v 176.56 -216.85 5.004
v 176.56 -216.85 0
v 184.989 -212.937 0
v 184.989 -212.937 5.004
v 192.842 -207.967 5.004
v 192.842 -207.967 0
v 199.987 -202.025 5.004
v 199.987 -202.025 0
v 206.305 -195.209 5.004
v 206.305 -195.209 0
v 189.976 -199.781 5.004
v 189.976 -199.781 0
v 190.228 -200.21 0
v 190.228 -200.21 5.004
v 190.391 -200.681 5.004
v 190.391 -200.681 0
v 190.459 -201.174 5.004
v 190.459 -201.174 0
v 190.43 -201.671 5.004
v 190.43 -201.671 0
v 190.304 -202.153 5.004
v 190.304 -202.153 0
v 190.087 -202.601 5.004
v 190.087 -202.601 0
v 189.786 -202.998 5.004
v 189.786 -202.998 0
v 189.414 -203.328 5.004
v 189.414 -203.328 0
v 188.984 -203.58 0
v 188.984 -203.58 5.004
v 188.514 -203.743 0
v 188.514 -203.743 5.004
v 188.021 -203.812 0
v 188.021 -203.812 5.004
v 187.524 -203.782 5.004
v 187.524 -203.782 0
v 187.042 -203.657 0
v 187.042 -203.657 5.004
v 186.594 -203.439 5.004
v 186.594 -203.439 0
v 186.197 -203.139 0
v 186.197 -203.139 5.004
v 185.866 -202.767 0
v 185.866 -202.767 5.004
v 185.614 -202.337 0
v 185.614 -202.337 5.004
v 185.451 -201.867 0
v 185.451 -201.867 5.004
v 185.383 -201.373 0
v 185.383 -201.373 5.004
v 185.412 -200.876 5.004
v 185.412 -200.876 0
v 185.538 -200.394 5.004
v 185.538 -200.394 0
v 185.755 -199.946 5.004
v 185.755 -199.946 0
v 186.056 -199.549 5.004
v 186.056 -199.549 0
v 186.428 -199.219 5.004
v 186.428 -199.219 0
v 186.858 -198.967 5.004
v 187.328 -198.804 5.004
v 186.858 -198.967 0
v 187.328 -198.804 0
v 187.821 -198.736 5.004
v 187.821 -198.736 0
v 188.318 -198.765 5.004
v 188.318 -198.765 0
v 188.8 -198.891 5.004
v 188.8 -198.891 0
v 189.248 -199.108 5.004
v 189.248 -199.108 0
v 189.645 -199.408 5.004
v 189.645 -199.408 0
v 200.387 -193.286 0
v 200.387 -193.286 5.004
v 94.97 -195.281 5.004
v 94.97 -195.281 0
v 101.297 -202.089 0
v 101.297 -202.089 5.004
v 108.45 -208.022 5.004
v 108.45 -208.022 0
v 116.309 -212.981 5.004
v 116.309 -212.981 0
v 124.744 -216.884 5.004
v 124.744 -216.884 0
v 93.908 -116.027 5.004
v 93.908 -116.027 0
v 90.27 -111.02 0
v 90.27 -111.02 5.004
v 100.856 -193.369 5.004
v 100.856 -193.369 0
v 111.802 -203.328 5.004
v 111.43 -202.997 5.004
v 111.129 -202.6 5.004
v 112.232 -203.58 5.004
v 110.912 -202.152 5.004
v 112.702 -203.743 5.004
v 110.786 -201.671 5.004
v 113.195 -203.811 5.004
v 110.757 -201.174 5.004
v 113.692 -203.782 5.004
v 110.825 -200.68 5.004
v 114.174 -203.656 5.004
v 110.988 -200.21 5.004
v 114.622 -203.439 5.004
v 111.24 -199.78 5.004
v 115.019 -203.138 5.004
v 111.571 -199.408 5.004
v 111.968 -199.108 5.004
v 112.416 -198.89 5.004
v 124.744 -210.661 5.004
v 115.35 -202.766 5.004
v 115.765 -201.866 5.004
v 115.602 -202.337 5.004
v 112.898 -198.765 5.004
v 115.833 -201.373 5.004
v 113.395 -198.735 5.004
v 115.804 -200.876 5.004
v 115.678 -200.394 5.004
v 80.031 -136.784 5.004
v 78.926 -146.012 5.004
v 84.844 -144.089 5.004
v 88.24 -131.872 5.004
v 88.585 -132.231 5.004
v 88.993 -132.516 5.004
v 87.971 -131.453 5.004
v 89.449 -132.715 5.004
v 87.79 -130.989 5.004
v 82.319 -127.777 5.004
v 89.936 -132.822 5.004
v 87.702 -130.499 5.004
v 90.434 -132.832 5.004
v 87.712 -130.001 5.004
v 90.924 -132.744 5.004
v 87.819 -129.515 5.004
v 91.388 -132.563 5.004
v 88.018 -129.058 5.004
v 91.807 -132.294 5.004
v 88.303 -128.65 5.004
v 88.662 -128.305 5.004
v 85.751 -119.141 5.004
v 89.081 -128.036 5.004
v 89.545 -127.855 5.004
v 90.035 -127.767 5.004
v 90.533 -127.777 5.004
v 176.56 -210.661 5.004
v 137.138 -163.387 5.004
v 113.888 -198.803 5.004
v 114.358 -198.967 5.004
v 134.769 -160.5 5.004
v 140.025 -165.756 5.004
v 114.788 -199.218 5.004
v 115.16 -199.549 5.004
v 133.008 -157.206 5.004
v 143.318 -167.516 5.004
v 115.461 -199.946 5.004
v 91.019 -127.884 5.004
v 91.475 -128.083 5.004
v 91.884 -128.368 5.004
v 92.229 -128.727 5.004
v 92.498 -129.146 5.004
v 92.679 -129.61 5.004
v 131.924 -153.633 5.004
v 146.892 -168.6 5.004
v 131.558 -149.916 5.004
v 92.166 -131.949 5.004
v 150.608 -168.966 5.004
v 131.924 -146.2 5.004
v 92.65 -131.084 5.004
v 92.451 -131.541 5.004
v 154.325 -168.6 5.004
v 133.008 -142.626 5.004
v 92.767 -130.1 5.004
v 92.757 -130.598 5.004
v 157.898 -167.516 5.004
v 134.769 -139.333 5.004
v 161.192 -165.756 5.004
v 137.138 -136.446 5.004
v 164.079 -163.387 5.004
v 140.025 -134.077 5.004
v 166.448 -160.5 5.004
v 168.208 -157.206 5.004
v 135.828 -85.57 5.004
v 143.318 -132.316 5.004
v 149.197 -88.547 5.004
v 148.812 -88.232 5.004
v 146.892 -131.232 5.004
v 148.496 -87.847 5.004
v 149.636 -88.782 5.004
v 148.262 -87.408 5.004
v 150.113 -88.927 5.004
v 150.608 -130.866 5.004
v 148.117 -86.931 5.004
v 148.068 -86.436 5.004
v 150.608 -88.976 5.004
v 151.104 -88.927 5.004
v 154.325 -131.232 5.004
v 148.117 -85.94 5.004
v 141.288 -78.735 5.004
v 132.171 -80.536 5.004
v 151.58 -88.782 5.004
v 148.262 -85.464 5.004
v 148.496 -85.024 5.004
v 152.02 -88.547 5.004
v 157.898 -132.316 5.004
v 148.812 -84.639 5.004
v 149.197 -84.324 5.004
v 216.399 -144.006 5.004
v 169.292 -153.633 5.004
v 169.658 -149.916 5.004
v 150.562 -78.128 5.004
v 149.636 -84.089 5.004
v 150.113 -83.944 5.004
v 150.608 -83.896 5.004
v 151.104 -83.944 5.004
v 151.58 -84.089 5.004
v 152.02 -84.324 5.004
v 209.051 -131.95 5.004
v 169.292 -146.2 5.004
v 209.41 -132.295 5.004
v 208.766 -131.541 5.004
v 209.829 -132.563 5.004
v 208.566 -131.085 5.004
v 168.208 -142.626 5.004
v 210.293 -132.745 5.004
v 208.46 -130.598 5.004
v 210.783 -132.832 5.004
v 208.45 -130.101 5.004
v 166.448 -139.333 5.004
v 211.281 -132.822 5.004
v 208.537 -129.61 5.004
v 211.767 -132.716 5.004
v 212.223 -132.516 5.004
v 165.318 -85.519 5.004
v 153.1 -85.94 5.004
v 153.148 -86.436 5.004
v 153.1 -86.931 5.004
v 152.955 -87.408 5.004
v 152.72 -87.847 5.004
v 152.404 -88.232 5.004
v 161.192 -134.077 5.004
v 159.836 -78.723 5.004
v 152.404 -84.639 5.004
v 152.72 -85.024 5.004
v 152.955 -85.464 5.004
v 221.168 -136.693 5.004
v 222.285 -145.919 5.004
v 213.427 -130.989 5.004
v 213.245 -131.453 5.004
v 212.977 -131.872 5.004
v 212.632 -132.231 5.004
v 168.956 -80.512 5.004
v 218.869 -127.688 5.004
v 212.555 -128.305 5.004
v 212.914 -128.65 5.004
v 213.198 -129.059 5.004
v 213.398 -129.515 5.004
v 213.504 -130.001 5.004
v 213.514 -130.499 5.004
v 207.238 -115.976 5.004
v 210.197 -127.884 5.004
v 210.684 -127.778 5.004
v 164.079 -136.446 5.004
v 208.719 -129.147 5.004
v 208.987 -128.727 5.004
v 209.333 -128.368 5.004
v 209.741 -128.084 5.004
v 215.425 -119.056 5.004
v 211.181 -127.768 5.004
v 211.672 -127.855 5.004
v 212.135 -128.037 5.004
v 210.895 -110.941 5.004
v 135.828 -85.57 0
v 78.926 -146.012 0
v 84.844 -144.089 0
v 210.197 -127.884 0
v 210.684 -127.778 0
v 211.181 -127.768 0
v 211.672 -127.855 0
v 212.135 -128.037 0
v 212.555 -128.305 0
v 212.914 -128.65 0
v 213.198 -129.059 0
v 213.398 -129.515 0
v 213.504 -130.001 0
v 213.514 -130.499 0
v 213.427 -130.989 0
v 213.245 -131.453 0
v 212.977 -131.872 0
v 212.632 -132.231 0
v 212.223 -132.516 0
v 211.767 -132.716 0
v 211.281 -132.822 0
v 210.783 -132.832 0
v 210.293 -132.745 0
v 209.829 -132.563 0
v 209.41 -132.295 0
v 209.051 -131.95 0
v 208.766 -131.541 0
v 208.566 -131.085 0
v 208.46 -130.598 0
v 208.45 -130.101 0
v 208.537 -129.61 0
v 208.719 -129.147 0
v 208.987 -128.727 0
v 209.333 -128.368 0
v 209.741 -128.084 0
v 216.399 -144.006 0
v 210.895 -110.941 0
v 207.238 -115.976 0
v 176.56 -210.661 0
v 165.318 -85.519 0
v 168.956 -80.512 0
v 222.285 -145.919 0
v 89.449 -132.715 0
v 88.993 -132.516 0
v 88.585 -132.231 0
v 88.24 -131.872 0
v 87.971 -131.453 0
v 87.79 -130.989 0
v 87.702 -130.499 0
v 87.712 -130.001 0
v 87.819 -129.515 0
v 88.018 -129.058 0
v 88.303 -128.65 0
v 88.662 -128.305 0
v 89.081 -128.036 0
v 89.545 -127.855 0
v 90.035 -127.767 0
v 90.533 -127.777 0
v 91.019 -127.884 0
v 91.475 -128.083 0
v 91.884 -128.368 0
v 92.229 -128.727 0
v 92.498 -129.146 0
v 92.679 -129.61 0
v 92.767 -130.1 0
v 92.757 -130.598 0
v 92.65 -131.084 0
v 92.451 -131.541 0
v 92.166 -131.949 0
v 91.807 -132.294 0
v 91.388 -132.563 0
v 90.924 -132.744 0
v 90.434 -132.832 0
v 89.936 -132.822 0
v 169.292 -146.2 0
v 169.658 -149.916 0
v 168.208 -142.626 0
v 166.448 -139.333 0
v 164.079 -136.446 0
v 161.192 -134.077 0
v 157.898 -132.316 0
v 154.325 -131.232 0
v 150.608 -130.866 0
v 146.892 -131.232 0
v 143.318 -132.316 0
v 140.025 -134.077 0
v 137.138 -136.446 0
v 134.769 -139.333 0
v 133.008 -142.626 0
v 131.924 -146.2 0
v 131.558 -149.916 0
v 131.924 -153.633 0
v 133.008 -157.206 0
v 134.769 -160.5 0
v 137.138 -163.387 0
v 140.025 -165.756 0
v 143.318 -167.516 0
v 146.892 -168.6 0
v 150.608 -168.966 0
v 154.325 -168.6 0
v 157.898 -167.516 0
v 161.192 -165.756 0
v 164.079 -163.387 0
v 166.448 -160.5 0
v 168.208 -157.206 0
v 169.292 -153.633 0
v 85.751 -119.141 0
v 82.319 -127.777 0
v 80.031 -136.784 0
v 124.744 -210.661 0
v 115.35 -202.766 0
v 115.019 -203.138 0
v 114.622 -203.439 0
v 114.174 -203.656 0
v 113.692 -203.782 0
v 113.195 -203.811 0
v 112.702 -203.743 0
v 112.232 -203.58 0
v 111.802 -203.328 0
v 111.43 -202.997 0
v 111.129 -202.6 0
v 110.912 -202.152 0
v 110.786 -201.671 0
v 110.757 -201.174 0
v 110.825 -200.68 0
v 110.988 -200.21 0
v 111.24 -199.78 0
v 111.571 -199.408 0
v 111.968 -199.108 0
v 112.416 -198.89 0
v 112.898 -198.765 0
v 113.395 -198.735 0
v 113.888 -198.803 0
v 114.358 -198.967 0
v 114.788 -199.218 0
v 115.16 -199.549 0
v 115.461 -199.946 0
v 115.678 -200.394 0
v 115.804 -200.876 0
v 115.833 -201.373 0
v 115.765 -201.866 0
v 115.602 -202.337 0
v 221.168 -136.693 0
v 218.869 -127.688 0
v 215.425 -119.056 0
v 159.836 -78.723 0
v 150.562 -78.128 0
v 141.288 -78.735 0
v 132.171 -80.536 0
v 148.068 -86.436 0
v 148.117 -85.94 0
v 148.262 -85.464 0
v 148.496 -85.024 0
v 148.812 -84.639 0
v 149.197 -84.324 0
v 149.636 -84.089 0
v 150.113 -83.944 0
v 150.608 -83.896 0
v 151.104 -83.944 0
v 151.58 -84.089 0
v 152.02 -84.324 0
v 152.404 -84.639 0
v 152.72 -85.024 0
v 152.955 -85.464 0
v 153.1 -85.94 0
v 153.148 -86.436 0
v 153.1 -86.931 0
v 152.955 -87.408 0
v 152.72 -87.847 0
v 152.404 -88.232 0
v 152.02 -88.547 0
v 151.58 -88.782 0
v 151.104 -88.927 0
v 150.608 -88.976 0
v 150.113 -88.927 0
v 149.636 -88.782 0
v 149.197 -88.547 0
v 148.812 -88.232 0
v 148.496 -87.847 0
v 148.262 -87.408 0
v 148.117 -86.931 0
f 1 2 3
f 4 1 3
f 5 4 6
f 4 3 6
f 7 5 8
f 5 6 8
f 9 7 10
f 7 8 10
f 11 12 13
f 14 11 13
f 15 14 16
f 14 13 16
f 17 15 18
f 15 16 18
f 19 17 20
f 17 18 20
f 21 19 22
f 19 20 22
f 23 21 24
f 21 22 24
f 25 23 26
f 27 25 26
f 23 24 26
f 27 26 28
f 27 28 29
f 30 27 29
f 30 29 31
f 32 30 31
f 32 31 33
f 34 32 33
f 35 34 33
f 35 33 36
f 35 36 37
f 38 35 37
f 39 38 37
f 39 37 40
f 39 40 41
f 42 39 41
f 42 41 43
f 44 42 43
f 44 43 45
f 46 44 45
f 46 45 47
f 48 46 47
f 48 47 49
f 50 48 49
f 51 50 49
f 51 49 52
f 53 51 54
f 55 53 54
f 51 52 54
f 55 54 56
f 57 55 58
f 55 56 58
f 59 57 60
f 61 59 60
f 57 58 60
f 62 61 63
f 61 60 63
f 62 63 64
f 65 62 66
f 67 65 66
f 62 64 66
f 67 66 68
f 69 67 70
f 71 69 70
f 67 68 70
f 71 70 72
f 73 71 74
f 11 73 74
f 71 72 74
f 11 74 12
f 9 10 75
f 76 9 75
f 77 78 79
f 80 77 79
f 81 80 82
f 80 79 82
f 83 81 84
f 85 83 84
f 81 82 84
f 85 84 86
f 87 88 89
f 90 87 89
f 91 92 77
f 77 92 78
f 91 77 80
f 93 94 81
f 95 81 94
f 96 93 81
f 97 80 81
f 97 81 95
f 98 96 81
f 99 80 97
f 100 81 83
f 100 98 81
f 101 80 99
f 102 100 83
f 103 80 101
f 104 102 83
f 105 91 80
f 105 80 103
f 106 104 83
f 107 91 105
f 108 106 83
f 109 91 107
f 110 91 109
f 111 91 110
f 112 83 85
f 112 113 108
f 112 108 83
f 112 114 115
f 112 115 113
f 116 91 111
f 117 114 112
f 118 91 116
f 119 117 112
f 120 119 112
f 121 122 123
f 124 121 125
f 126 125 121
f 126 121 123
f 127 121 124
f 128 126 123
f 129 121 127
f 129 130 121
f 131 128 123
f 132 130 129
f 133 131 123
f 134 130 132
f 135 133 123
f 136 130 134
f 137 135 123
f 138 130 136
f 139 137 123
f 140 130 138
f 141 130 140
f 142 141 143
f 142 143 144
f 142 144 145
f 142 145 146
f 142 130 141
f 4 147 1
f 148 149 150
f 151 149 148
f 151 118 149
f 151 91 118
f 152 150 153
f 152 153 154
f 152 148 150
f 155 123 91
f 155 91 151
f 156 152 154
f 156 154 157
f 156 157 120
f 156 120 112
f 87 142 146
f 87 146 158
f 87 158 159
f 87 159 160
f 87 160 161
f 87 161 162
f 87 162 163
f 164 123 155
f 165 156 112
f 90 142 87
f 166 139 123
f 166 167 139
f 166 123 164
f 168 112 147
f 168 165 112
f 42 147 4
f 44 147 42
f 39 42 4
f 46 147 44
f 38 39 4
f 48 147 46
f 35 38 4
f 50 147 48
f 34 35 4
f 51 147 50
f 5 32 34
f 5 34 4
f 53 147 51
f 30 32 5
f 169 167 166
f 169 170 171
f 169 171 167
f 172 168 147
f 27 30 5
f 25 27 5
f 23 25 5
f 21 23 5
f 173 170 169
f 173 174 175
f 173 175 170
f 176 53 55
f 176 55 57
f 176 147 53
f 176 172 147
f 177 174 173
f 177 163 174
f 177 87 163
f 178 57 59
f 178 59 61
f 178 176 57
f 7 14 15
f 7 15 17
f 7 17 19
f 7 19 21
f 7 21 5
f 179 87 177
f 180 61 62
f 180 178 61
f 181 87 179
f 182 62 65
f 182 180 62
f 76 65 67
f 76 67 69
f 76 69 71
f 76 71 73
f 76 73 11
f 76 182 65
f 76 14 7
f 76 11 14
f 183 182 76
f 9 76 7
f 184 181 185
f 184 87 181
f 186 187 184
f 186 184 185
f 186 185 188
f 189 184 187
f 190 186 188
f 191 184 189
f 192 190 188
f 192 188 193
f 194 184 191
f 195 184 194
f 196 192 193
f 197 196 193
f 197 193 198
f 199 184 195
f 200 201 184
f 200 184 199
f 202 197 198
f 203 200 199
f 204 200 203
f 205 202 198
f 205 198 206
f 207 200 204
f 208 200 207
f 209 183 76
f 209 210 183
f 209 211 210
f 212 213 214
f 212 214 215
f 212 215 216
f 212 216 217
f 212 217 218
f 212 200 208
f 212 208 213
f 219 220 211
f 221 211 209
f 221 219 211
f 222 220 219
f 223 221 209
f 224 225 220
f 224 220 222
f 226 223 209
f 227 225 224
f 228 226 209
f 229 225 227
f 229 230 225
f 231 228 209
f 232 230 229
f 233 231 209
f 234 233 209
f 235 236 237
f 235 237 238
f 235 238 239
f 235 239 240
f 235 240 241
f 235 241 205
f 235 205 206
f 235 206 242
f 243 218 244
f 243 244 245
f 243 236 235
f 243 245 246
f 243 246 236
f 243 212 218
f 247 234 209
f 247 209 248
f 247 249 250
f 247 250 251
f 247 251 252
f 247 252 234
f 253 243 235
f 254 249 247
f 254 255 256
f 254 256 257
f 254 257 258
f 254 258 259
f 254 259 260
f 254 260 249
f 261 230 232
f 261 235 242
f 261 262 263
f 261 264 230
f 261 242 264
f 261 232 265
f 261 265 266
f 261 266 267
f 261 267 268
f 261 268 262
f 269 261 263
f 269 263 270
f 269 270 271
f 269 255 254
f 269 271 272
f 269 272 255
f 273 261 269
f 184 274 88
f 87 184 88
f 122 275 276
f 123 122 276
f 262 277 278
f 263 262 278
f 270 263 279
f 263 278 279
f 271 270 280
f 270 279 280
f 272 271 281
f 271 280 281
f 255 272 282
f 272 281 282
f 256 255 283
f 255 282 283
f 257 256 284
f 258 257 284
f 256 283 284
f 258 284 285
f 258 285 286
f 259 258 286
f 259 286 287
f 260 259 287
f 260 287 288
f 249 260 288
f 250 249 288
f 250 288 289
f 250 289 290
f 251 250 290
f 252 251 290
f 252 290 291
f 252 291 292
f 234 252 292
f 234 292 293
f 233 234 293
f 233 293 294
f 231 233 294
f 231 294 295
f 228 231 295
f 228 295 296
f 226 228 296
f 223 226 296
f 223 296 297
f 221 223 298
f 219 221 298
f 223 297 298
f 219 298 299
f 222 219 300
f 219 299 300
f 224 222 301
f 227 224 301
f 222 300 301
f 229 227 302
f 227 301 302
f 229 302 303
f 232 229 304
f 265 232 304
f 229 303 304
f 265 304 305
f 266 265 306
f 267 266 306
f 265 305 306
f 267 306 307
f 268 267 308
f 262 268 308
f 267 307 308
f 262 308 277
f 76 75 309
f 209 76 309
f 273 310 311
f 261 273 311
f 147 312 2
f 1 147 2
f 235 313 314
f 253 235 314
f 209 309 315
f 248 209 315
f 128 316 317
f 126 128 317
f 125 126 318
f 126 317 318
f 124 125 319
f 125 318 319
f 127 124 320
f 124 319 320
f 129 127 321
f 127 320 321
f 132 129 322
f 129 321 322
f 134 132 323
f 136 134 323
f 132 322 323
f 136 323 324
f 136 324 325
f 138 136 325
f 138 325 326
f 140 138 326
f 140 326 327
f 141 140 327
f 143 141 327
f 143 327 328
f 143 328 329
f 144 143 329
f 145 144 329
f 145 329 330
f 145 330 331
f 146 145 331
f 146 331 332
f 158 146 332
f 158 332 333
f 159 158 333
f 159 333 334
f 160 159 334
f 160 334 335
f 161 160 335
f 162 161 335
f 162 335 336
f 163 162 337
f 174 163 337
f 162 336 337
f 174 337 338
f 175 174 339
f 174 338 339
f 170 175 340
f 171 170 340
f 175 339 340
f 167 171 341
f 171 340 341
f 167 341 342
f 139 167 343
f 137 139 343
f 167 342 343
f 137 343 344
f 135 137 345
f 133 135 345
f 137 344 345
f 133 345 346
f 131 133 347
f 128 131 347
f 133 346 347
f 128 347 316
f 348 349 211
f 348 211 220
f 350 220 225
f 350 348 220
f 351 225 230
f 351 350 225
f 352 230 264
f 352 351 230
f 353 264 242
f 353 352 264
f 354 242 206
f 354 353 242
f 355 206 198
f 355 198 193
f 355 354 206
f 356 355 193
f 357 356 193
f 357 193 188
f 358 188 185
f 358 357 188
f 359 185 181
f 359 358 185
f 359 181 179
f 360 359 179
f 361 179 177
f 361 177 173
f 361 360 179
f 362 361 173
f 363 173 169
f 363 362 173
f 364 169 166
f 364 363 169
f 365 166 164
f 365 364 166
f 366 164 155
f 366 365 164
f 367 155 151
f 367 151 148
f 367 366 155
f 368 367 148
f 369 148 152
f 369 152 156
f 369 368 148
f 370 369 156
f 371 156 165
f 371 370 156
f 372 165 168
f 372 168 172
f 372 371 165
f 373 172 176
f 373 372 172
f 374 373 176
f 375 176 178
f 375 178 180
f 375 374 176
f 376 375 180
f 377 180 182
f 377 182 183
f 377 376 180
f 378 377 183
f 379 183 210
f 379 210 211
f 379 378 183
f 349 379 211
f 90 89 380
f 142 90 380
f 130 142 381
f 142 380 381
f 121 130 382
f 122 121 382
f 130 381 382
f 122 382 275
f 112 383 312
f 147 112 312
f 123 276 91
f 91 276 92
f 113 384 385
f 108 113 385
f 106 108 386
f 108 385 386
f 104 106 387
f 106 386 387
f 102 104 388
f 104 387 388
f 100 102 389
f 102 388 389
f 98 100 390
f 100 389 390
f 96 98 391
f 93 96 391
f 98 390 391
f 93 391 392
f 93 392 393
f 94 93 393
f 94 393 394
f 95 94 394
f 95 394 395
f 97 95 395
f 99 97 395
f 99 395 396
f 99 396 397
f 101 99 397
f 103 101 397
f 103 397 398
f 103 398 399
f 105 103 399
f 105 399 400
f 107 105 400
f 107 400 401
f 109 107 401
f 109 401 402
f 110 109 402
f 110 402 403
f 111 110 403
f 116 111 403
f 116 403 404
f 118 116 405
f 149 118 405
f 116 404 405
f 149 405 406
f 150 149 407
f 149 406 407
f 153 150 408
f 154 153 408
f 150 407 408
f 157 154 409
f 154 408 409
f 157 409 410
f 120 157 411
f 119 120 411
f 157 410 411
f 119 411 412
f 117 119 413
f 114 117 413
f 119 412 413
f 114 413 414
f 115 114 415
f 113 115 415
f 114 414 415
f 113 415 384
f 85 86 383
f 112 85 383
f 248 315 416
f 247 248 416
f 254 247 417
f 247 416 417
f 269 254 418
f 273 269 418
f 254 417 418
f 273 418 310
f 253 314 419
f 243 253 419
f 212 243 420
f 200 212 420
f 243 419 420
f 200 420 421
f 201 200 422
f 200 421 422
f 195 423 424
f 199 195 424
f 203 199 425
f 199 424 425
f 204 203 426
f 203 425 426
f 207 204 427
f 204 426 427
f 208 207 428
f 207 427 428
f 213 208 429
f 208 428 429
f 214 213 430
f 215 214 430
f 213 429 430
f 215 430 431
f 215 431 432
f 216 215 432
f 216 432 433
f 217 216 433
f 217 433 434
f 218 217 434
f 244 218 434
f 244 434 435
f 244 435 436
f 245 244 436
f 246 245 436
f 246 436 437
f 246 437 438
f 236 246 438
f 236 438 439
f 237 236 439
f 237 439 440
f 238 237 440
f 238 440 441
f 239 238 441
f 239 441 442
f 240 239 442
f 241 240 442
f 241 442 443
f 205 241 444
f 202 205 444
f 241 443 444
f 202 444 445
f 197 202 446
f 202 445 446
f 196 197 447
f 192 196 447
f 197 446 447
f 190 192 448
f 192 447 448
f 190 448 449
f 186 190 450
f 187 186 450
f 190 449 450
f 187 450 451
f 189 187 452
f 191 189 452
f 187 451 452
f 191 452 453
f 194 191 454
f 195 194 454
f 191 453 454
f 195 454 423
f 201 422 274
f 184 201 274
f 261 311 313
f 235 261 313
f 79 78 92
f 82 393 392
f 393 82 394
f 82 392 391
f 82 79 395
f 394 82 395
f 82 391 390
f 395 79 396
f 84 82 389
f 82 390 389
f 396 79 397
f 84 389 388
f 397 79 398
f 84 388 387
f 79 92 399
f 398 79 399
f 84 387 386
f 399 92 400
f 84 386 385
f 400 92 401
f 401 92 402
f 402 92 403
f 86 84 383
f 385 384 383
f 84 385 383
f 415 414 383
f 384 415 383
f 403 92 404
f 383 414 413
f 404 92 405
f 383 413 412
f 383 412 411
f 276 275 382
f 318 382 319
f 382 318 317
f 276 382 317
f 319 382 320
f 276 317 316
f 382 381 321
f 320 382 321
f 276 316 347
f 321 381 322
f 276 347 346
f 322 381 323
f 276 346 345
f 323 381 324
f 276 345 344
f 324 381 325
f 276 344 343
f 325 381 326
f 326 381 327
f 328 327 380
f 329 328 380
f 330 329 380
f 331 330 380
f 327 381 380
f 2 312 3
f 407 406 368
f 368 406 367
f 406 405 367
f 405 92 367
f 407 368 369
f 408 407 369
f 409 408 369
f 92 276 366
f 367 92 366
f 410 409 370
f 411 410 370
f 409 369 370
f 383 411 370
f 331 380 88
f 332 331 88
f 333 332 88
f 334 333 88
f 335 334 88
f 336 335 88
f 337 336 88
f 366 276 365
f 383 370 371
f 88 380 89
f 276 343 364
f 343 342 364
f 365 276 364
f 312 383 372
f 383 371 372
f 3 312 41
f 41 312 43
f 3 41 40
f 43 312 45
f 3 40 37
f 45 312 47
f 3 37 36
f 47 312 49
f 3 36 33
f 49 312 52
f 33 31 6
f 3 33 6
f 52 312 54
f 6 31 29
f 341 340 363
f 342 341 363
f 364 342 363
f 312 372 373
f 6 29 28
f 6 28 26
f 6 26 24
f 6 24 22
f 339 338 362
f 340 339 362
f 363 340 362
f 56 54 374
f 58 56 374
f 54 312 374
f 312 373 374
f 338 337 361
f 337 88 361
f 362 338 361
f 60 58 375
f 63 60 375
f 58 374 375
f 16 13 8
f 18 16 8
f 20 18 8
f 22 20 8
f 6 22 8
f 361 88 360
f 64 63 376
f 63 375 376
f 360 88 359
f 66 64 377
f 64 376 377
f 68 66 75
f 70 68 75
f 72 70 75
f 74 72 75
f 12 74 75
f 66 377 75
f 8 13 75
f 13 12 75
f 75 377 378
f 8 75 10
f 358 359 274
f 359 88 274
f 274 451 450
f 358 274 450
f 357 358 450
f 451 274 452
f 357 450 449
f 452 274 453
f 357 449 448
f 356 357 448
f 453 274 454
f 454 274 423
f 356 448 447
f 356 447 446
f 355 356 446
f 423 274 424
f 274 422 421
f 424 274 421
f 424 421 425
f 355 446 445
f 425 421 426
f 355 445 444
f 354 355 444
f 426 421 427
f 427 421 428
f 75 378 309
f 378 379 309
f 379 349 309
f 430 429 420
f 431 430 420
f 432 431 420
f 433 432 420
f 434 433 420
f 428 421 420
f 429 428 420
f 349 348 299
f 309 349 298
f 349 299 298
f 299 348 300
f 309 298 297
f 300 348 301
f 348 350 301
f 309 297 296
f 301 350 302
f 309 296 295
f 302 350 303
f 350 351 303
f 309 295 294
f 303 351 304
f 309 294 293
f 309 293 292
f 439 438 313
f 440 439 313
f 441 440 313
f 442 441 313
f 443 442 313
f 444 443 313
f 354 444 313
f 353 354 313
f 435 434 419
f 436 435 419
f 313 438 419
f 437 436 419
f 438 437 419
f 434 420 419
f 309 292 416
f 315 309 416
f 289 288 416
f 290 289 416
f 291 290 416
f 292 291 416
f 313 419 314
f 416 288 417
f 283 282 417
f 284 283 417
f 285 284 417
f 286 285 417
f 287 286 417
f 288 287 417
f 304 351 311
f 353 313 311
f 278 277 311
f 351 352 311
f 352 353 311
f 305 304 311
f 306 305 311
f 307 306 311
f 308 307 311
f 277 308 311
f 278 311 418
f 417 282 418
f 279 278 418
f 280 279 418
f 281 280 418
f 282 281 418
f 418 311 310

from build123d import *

# Parameters (mm, degrees)
SKETCH1_R           = 19.05
BOSS_EXTRUDE2_DEPTH = 5.0038
SKETCH2_R           = 2.54
CUT_EXTRUDE1_DEPTH  = 7.5438
CIRPATTERN1_COUNT   = 5


with BuildPart() as part:
    # Sketch1 → Boss-Extrude2 (new body)
    with BuildSketch(Plane.XY):
        with BuildLine():
            Line((207.237556858, -115.975983371), (165.317532277, -85.519302738))
            Line((165.317532277, -85.519302738), (168.955516395, -80.512047172))
            ThreePointArc((168.955516395, -80.512047172), (150.561502758, -78.127913016), (132.170605091, -80.535965413))
            Line((132.170605091, -80.535965413), (135.828392716, -85.570478169))
            Line((135.828392716, -85.570478169), (93.908368135, -116.027158802))
            Line((93.908368135, -116.027158802), (90.270384017, -111.019903235))
            ThreePointArc((90.270384017, -111.019903235), (82.318874884, -127.776911795), (78.925968887, -146.011823976))
            Line((78.925968887, -146.011823976), (84.844393588, -144.08881122))
            Line((84.844393588, -144.08881122), (100.856418169, -193.368755668))
            Line((100.856418169, -193.368755668), (94.970036216, -195.281357105))
            ThreePointArc((94.970036216, -195.281357105), (108.449746946, -208.0218921), (124.743713387, -216.883635212))
            Line((124.743713387, -216.883635212), (124.743713387, -210.660635212))
            Line((124.743713387, -210.660635212), (176.559713387, -210.660635212))
            Line((176.559713387, -210.660635212), (176.559713387, -216.849943473))
            ThreePointArc((176.559713387, -216.849943473), (192.842141911, -207.967018576), (206.305272979, -195.208964837))
            Line((206.305272979, -195.208964837), (200.386848278, -193.285952081))
            Line((200.386848278, -193.285952081), (216.398872859, -144.006007633))
            Line((216.398872859, -144.006007633), (222.285254812, -145.918609069))
            ThreePointArc((222.285254812, -145.918609069), (218.868638328, -127.688124568), (210.895344483, -110.941470615))
            Line((210.895344483, -110.941470615), (207.237556858, -115.975983371))
        make_face()
        with Locations((150.608180965, -149.916372011)):
            Circle(SKETCH1_R, mode=Mode.SUBTRACT)
    extrude(amount=BOSS_EXTRUDE2_DEPTH)

    # Sketch2 → Cut-Extrude1 (cut)
    with BuildSketch(Plane(origin=(0, 0, 0), x_dir=(-1, 0, 0), z_dir=(0, 0, -1))):
        with Locations((-150.608395424, -86.435544776)):
            Circle(SKETCH2_R)
    cut_extrude1 = extrude(amount=-CUT_EXTRUDE1_DEPTH, mode=Mode.SUBTRACT)

    # CirPattern1: Cut-Extrude1 ×5 about axis
    cirpattern1_axis = Axis((150.608180965, -149.916372011, 0), (0, 0, 1))
    for i in range(1, CIRPATTERN1_COUNT):
        add(cut_extrude1.rotate(cirpattern1_axis, i * 360 / CIRPATTERN1_COUNT), mode=Mode.SUBTRACT)


solid = part.part
